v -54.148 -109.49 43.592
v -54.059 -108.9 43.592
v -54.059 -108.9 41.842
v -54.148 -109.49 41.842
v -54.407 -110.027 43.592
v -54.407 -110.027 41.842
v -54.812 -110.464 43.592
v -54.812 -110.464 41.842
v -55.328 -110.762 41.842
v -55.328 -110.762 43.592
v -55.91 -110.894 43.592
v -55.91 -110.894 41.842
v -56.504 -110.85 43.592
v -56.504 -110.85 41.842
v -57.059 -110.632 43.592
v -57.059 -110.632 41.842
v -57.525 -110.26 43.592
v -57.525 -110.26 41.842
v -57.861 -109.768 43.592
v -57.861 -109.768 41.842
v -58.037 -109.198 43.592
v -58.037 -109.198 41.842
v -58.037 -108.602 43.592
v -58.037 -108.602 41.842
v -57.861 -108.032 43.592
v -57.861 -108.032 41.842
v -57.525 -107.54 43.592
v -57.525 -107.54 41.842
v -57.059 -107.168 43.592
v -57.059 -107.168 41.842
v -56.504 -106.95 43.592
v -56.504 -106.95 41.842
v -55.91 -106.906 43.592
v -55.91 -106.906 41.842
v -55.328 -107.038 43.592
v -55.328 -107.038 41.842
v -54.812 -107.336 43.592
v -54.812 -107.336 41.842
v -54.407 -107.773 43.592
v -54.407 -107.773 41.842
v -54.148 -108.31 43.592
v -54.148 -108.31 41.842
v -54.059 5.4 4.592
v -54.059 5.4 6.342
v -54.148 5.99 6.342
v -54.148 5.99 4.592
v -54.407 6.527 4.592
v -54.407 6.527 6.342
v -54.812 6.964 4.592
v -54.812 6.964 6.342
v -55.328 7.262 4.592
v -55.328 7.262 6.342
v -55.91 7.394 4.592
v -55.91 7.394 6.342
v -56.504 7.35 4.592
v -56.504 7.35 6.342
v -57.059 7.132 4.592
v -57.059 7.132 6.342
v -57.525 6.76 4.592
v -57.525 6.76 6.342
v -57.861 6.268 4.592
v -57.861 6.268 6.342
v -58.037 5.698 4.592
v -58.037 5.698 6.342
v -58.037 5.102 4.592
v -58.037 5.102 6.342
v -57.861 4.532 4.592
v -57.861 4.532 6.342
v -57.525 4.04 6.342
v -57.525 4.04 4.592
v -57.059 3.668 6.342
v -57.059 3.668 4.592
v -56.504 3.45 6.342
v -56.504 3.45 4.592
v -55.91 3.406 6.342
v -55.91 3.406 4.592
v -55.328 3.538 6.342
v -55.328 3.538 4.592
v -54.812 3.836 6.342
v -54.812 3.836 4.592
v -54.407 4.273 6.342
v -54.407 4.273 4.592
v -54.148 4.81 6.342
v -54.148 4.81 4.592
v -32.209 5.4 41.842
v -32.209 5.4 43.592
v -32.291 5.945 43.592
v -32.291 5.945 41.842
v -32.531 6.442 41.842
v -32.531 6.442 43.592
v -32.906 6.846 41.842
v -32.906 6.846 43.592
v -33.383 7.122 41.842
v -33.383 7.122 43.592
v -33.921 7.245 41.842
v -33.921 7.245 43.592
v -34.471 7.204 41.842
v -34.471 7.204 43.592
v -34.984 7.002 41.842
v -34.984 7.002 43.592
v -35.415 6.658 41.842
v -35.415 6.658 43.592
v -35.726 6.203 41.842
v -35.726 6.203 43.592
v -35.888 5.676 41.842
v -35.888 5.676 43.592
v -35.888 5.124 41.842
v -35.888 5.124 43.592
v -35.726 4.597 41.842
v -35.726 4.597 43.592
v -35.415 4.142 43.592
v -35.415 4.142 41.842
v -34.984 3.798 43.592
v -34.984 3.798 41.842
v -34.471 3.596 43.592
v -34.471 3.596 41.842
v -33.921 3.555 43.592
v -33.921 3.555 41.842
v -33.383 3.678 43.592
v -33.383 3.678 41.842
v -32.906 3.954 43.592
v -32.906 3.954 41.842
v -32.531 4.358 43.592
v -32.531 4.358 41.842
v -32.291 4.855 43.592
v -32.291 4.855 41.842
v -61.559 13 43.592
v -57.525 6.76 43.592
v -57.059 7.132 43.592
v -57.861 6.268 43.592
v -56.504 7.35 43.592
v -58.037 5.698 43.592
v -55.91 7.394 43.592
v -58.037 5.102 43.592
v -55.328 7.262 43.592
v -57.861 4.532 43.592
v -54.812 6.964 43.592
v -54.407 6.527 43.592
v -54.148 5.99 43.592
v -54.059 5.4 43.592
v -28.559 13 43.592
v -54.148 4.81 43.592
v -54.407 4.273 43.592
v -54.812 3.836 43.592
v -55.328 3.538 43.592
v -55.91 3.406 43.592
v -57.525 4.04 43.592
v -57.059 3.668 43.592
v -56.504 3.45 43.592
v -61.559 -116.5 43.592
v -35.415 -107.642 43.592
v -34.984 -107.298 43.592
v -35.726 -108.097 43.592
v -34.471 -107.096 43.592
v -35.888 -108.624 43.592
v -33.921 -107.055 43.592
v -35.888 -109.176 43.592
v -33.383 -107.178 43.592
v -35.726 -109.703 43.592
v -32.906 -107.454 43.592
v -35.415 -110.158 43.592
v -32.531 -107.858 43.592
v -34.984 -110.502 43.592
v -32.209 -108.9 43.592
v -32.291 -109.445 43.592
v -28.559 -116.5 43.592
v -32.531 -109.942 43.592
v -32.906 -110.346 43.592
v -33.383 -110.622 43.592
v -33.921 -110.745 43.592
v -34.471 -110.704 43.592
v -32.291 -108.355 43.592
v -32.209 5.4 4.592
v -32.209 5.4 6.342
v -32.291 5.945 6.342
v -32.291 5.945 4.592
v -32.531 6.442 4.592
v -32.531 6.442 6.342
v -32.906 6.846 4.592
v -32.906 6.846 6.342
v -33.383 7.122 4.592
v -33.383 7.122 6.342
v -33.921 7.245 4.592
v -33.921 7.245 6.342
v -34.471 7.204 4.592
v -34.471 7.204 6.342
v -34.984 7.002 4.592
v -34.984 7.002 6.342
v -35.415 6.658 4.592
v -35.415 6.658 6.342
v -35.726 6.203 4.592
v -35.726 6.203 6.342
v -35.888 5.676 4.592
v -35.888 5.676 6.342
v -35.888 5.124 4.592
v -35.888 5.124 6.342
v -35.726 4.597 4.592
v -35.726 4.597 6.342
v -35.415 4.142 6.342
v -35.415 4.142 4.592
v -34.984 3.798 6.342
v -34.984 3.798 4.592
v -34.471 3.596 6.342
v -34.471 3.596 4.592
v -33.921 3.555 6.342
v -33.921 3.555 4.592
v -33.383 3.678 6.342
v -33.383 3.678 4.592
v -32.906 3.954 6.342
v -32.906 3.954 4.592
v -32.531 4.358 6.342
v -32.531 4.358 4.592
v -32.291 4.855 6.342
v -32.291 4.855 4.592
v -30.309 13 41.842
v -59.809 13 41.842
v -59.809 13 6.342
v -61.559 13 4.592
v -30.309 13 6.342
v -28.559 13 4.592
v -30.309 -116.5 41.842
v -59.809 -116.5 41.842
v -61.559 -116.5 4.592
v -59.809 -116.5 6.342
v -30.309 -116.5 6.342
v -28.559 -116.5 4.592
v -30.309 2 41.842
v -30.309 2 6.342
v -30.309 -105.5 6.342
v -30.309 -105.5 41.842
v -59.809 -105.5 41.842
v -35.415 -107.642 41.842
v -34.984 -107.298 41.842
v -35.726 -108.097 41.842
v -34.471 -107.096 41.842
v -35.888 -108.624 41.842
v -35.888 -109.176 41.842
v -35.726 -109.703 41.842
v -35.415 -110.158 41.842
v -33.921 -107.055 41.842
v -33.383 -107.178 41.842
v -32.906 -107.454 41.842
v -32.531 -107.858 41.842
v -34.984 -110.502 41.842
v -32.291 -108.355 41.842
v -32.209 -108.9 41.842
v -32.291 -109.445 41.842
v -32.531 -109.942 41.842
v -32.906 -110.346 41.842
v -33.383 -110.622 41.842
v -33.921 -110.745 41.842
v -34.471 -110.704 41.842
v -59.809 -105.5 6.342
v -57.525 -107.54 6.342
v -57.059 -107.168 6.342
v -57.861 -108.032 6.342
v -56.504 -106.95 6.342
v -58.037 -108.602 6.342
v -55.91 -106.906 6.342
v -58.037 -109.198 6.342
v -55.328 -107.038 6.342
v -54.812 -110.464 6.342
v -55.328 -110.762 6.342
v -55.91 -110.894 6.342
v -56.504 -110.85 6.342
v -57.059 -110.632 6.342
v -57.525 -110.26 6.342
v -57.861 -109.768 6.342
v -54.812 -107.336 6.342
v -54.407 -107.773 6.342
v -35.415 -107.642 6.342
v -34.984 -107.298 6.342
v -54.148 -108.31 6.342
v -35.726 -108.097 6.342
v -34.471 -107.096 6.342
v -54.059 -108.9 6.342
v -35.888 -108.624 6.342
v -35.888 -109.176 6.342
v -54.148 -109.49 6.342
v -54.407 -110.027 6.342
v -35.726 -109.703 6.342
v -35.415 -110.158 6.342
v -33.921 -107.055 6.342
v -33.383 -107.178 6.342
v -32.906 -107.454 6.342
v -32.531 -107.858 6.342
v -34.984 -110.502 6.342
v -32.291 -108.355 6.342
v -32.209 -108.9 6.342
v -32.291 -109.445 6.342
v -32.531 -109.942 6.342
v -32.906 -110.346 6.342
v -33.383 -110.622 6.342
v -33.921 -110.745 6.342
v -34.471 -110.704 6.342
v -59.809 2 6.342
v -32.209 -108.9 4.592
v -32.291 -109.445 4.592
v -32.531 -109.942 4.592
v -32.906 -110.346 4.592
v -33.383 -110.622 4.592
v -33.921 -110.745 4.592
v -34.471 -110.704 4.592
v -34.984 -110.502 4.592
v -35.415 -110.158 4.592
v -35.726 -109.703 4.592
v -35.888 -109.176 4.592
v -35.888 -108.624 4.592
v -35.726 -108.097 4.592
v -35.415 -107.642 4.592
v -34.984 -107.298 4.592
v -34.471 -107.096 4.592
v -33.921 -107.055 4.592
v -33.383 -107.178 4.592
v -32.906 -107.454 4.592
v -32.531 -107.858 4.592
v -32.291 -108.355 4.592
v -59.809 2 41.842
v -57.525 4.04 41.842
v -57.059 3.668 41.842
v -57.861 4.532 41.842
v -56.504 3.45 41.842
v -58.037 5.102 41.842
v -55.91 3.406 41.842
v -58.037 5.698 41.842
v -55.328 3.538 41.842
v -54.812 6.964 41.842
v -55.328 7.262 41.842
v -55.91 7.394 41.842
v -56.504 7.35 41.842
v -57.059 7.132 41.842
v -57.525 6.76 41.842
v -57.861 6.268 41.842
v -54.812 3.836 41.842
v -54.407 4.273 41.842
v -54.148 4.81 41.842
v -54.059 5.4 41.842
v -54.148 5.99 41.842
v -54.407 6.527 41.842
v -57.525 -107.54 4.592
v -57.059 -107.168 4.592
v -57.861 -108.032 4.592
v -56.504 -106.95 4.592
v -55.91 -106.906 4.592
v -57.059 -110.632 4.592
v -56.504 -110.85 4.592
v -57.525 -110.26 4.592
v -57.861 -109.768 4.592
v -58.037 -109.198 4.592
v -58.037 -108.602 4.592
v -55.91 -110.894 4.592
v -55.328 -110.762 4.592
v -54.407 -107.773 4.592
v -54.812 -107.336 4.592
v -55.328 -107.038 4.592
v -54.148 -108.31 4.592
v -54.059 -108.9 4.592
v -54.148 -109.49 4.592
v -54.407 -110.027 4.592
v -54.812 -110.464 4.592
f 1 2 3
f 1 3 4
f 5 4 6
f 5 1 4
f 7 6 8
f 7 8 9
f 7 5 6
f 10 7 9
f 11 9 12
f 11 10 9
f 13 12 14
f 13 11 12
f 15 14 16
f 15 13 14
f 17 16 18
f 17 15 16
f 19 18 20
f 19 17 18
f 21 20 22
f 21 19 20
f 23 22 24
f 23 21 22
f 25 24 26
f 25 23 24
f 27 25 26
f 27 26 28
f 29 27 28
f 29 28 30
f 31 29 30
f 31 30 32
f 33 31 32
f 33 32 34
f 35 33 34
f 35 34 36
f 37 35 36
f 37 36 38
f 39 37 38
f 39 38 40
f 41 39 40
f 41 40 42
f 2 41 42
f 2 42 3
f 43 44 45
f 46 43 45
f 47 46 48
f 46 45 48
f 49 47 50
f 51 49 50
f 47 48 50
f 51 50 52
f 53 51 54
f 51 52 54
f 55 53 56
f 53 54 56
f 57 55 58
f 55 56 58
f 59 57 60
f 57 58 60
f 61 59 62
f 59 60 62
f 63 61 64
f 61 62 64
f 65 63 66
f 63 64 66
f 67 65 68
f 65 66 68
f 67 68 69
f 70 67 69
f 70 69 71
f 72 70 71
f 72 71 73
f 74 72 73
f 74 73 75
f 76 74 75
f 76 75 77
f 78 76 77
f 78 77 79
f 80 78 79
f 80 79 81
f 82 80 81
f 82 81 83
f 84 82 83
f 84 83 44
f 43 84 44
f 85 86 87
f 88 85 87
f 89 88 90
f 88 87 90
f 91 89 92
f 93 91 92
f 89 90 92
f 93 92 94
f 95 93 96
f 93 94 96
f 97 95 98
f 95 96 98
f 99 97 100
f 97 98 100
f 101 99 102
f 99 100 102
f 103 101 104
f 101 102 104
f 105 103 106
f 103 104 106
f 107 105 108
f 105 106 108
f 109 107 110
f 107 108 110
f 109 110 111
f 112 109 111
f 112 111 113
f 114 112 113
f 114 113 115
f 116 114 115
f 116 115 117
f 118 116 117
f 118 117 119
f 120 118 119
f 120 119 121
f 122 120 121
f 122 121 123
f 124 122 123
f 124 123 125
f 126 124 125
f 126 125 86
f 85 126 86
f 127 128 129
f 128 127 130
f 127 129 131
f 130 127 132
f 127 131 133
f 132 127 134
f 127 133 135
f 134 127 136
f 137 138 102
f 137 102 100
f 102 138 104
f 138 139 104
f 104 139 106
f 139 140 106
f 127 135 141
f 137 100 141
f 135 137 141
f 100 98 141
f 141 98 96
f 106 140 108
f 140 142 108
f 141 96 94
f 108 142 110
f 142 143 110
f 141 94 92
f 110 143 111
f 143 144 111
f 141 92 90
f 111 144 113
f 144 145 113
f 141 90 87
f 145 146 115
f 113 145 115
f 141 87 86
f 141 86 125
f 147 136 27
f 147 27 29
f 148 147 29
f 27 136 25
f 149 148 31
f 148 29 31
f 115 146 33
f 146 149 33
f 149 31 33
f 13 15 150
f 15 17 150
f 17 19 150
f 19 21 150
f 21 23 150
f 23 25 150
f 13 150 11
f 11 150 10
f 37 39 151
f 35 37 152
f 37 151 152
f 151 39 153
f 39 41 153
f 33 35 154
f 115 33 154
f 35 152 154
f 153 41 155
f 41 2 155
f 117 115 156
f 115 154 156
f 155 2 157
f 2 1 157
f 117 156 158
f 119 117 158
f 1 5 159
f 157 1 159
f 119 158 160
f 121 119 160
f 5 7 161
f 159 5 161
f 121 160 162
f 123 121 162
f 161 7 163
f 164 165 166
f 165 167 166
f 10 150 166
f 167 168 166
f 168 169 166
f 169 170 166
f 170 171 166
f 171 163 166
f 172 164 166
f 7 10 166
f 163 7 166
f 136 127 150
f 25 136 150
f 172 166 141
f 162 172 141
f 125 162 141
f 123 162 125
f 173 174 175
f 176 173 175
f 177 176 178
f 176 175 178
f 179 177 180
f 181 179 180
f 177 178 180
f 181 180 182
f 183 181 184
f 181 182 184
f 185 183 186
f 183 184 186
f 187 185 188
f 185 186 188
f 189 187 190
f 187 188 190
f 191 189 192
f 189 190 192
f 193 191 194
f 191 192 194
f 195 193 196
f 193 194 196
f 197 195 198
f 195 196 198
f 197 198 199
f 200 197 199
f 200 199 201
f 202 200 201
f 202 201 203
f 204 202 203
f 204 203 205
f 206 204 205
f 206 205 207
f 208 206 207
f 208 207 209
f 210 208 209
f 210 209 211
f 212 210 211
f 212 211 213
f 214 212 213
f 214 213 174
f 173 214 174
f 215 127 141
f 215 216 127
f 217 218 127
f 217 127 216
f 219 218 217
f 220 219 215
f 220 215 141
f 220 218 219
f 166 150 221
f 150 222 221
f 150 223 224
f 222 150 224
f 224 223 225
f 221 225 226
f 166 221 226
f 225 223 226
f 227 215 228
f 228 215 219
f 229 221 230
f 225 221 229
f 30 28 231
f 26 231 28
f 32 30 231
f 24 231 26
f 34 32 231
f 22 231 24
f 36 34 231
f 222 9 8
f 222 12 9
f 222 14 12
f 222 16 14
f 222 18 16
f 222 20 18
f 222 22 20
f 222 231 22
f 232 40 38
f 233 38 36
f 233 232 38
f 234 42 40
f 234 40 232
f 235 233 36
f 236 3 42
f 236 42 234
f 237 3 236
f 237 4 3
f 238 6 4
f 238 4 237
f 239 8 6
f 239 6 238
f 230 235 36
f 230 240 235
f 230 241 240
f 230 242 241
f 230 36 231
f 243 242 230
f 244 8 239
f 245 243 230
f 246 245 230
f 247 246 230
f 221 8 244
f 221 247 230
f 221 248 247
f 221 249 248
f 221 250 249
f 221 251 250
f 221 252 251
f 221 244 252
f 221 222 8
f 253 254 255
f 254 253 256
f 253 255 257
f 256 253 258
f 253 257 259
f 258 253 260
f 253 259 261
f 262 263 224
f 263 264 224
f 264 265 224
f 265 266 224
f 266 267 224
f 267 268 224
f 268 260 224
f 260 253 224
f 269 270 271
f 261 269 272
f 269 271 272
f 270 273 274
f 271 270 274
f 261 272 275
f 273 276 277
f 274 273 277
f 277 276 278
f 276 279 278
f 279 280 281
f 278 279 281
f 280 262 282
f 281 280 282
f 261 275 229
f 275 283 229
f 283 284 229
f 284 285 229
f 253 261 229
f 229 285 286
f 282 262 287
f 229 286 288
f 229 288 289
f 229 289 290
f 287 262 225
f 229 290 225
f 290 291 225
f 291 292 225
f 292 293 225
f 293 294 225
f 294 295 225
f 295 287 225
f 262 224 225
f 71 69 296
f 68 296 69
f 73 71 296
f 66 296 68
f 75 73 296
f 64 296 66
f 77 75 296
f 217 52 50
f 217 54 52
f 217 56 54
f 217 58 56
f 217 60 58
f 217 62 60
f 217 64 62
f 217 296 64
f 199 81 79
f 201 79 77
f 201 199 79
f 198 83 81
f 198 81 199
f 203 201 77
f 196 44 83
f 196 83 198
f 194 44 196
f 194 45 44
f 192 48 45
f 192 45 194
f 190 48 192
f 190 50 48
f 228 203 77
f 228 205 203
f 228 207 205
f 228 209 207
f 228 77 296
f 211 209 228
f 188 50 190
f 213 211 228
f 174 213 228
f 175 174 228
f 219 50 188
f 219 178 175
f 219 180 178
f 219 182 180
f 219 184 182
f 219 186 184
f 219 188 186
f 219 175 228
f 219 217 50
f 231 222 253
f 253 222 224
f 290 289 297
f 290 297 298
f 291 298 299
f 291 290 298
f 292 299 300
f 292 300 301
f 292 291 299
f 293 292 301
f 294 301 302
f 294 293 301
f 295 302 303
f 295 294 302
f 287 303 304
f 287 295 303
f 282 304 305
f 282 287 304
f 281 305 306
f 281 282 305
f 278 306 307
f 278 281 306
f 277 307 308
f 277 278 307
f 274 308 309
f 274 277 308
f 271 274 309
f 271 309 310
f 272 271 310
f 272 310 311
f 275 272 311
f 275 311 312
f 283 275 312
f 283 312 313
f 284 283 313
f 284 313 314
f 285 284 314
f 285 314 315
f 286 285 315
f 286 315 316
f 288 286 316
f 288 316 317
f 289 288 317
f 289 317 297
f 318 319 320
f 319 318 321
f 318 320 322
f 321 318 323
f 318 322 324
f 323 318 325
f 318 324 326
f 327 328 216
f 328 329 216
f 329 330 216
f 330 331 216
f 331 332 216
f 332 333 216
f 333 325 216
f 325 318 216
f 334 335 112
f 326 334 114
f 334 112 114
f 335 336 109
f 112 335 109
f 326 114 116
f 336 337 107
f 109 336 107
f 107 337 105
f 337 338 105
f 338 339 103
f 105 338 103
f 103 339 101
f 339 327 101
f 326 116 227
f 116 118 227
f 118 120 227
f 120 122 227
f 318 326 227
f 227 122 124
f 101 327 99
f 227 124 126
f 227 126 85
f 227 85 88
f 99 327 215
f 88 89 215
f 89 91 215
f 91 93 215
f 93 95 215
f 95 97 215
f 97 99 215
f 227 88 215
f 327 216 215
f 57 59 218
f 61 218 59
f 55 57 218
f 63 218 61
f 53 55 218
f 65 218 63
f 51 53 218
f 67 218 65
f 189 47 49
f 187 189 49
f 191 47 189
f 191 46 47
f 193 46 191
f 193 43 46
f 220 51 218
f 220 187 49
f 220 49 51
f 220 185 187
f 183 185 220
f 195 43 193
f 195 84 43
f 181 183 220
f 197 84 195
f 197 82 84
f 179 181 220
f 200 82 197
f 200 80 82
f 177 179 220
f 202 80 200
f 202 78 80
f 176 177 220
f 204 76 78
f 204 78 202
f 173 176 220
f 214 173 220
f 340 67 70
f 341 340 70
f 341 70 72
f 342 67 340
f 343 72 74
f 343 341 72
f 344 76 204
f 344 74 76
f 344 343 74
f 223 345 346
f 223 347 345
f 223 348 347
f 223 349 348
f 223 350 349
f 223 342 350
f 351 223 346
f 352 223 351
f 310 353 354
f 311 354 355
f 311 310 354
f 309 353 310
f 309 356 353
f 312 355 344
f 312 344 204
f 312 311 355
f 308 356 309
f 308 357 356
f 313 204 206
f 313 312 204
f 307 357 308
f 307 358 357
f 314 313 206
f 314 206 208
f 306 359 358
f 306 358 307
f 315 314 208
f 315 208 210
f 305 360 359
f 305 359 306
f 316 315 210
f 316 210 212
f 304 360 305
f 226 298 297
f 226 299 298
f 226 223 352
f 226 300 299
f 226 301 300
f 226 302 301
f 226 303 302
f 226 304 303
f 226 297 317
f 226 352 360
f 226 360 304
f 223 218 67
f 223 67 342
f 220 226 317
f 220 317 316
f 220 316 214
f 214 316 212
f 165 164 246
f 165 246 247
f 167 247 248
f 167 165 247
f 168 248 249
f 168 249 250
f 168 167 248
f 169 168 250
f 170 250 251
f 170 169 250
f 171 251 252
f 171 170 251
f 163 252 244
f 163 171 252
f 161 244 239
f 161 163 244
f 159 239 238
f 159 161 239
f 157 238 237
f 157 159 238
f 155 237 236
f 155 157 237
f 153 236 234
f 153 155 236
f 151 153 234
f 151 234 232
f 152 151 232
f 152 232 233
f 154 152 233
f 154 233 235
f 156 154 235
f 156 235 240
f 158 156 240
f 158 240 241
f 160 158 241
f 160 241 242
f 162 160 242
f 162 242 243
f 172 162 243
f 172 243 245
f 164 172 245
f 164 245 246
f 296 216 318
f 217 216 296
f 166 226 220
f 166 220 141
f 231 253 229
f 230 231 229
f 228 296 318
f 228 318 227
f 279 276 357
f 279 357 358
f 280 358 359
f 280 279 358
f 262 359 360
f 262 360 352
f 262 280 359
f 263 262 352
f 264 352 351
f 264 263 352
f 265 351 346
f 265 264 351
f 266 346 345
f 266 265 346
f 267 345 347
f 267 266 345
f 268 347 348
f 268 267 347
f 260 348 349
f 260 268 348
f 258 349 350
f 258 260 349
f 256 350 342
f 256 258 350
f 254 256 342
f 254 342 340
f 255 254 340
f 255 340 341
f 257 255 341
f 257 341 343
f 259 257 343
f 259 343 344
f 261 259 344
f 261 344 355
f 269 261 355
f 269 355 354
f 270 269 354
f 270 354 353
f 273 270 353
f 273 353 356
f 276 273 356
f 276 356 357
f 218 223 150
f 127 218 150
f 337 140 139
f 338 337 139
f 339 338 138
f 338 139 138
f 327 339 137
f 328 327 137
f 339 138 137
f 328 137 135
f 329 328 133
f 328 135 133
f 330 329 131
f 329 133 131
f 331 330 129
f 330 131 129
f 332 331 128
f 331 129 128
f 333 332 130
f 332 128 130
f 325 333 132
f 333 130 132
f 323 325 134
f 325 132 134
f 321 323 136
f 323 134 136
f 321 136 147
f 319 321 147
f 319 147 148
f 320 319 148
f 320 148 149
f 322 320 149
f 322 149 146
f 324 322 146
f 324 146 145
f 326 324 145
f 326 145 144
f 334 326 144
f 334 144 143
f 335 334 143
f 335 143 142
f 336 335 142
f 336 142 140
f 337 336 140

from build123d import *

# Parameters (mm, degrees)
SKETCH1_W           = 33
SKETCH1_H           = 39
BOSS_EXTRUDE1_DEPTH = 13
SKETCH2_W           = 29.5
SKETCH2_H           = 35.5
CUT_EXTRUDE1_DEPTH  = 11
SKETCH3_R           = 1.85
SKETCH3_R_2         = 2
CUT_EXTRUDE2_DEPTH  = 57
SKETCH4_W           = 33
SKETCH4_H           = 39
BOSS_EXTRUDE2_DEPTH = 51.749999878


with BuildPart() as part:
    # Sketch1 → Boss-Extrude1 (new body)
    with BuildSketch(Plane(origin=(0, 0, 0), x_dir=(1, 0, 0), z_dir=(0, 1, 0))):
        with Locations((-45.059131656, -24.092112369)):
            Rectangle(SKETCH1_W, SKETCH1_H)
    extrude(amount=BOSS_EXTRUDE1_DEPTH)

    # Sketch2 → Cut-Extrude1 (cut)
    with BuildSketch(Plane(origin=(0, 13, 0), x_dir=(1, 0, 0), z_dir=(0, 1, 0))):
        with Locations((-45.059131656, -24.092112369)):
            Rectangle(SKETCH2_W, SKETCH2_H)
    extrude(amount=-CUT_EXTRUDE1_DEPTH, mode=Mode.SUBTRACT)

    # Sketch3 → Cut-Extrude2 (cut)
    with BuildSketch(Plane.XY.offset(43.592112369)):
        with Locations((-34.059131656, 5.4)):
            Circle(SKETCH3_R)
        with Locations((-56.059131656, 5.4)):
            Circle(SKETCH3_R_2)
    extrude(amount=-CUT_EXTRUDE2_DEPTH, mode=Mode.SUBTRACT)

    # Sketch4 → Boss-Extrude2 (add)
    with BuildSketch(Plane.XZ):
        with Locations((-45.059131656, 24.092112369)):
            Rectangle(SKETCH4_W, SKETCH4_H)
    extrude(amount=BOSS_EXTRUDE2_DEPTH)

    # Mirror7: part across plane


with BuildPart() as part_1:
    add(part.part)
    add(part.part.mirror(Plane.ZX.offset(-51.749999878)))


solid = part_1.part
